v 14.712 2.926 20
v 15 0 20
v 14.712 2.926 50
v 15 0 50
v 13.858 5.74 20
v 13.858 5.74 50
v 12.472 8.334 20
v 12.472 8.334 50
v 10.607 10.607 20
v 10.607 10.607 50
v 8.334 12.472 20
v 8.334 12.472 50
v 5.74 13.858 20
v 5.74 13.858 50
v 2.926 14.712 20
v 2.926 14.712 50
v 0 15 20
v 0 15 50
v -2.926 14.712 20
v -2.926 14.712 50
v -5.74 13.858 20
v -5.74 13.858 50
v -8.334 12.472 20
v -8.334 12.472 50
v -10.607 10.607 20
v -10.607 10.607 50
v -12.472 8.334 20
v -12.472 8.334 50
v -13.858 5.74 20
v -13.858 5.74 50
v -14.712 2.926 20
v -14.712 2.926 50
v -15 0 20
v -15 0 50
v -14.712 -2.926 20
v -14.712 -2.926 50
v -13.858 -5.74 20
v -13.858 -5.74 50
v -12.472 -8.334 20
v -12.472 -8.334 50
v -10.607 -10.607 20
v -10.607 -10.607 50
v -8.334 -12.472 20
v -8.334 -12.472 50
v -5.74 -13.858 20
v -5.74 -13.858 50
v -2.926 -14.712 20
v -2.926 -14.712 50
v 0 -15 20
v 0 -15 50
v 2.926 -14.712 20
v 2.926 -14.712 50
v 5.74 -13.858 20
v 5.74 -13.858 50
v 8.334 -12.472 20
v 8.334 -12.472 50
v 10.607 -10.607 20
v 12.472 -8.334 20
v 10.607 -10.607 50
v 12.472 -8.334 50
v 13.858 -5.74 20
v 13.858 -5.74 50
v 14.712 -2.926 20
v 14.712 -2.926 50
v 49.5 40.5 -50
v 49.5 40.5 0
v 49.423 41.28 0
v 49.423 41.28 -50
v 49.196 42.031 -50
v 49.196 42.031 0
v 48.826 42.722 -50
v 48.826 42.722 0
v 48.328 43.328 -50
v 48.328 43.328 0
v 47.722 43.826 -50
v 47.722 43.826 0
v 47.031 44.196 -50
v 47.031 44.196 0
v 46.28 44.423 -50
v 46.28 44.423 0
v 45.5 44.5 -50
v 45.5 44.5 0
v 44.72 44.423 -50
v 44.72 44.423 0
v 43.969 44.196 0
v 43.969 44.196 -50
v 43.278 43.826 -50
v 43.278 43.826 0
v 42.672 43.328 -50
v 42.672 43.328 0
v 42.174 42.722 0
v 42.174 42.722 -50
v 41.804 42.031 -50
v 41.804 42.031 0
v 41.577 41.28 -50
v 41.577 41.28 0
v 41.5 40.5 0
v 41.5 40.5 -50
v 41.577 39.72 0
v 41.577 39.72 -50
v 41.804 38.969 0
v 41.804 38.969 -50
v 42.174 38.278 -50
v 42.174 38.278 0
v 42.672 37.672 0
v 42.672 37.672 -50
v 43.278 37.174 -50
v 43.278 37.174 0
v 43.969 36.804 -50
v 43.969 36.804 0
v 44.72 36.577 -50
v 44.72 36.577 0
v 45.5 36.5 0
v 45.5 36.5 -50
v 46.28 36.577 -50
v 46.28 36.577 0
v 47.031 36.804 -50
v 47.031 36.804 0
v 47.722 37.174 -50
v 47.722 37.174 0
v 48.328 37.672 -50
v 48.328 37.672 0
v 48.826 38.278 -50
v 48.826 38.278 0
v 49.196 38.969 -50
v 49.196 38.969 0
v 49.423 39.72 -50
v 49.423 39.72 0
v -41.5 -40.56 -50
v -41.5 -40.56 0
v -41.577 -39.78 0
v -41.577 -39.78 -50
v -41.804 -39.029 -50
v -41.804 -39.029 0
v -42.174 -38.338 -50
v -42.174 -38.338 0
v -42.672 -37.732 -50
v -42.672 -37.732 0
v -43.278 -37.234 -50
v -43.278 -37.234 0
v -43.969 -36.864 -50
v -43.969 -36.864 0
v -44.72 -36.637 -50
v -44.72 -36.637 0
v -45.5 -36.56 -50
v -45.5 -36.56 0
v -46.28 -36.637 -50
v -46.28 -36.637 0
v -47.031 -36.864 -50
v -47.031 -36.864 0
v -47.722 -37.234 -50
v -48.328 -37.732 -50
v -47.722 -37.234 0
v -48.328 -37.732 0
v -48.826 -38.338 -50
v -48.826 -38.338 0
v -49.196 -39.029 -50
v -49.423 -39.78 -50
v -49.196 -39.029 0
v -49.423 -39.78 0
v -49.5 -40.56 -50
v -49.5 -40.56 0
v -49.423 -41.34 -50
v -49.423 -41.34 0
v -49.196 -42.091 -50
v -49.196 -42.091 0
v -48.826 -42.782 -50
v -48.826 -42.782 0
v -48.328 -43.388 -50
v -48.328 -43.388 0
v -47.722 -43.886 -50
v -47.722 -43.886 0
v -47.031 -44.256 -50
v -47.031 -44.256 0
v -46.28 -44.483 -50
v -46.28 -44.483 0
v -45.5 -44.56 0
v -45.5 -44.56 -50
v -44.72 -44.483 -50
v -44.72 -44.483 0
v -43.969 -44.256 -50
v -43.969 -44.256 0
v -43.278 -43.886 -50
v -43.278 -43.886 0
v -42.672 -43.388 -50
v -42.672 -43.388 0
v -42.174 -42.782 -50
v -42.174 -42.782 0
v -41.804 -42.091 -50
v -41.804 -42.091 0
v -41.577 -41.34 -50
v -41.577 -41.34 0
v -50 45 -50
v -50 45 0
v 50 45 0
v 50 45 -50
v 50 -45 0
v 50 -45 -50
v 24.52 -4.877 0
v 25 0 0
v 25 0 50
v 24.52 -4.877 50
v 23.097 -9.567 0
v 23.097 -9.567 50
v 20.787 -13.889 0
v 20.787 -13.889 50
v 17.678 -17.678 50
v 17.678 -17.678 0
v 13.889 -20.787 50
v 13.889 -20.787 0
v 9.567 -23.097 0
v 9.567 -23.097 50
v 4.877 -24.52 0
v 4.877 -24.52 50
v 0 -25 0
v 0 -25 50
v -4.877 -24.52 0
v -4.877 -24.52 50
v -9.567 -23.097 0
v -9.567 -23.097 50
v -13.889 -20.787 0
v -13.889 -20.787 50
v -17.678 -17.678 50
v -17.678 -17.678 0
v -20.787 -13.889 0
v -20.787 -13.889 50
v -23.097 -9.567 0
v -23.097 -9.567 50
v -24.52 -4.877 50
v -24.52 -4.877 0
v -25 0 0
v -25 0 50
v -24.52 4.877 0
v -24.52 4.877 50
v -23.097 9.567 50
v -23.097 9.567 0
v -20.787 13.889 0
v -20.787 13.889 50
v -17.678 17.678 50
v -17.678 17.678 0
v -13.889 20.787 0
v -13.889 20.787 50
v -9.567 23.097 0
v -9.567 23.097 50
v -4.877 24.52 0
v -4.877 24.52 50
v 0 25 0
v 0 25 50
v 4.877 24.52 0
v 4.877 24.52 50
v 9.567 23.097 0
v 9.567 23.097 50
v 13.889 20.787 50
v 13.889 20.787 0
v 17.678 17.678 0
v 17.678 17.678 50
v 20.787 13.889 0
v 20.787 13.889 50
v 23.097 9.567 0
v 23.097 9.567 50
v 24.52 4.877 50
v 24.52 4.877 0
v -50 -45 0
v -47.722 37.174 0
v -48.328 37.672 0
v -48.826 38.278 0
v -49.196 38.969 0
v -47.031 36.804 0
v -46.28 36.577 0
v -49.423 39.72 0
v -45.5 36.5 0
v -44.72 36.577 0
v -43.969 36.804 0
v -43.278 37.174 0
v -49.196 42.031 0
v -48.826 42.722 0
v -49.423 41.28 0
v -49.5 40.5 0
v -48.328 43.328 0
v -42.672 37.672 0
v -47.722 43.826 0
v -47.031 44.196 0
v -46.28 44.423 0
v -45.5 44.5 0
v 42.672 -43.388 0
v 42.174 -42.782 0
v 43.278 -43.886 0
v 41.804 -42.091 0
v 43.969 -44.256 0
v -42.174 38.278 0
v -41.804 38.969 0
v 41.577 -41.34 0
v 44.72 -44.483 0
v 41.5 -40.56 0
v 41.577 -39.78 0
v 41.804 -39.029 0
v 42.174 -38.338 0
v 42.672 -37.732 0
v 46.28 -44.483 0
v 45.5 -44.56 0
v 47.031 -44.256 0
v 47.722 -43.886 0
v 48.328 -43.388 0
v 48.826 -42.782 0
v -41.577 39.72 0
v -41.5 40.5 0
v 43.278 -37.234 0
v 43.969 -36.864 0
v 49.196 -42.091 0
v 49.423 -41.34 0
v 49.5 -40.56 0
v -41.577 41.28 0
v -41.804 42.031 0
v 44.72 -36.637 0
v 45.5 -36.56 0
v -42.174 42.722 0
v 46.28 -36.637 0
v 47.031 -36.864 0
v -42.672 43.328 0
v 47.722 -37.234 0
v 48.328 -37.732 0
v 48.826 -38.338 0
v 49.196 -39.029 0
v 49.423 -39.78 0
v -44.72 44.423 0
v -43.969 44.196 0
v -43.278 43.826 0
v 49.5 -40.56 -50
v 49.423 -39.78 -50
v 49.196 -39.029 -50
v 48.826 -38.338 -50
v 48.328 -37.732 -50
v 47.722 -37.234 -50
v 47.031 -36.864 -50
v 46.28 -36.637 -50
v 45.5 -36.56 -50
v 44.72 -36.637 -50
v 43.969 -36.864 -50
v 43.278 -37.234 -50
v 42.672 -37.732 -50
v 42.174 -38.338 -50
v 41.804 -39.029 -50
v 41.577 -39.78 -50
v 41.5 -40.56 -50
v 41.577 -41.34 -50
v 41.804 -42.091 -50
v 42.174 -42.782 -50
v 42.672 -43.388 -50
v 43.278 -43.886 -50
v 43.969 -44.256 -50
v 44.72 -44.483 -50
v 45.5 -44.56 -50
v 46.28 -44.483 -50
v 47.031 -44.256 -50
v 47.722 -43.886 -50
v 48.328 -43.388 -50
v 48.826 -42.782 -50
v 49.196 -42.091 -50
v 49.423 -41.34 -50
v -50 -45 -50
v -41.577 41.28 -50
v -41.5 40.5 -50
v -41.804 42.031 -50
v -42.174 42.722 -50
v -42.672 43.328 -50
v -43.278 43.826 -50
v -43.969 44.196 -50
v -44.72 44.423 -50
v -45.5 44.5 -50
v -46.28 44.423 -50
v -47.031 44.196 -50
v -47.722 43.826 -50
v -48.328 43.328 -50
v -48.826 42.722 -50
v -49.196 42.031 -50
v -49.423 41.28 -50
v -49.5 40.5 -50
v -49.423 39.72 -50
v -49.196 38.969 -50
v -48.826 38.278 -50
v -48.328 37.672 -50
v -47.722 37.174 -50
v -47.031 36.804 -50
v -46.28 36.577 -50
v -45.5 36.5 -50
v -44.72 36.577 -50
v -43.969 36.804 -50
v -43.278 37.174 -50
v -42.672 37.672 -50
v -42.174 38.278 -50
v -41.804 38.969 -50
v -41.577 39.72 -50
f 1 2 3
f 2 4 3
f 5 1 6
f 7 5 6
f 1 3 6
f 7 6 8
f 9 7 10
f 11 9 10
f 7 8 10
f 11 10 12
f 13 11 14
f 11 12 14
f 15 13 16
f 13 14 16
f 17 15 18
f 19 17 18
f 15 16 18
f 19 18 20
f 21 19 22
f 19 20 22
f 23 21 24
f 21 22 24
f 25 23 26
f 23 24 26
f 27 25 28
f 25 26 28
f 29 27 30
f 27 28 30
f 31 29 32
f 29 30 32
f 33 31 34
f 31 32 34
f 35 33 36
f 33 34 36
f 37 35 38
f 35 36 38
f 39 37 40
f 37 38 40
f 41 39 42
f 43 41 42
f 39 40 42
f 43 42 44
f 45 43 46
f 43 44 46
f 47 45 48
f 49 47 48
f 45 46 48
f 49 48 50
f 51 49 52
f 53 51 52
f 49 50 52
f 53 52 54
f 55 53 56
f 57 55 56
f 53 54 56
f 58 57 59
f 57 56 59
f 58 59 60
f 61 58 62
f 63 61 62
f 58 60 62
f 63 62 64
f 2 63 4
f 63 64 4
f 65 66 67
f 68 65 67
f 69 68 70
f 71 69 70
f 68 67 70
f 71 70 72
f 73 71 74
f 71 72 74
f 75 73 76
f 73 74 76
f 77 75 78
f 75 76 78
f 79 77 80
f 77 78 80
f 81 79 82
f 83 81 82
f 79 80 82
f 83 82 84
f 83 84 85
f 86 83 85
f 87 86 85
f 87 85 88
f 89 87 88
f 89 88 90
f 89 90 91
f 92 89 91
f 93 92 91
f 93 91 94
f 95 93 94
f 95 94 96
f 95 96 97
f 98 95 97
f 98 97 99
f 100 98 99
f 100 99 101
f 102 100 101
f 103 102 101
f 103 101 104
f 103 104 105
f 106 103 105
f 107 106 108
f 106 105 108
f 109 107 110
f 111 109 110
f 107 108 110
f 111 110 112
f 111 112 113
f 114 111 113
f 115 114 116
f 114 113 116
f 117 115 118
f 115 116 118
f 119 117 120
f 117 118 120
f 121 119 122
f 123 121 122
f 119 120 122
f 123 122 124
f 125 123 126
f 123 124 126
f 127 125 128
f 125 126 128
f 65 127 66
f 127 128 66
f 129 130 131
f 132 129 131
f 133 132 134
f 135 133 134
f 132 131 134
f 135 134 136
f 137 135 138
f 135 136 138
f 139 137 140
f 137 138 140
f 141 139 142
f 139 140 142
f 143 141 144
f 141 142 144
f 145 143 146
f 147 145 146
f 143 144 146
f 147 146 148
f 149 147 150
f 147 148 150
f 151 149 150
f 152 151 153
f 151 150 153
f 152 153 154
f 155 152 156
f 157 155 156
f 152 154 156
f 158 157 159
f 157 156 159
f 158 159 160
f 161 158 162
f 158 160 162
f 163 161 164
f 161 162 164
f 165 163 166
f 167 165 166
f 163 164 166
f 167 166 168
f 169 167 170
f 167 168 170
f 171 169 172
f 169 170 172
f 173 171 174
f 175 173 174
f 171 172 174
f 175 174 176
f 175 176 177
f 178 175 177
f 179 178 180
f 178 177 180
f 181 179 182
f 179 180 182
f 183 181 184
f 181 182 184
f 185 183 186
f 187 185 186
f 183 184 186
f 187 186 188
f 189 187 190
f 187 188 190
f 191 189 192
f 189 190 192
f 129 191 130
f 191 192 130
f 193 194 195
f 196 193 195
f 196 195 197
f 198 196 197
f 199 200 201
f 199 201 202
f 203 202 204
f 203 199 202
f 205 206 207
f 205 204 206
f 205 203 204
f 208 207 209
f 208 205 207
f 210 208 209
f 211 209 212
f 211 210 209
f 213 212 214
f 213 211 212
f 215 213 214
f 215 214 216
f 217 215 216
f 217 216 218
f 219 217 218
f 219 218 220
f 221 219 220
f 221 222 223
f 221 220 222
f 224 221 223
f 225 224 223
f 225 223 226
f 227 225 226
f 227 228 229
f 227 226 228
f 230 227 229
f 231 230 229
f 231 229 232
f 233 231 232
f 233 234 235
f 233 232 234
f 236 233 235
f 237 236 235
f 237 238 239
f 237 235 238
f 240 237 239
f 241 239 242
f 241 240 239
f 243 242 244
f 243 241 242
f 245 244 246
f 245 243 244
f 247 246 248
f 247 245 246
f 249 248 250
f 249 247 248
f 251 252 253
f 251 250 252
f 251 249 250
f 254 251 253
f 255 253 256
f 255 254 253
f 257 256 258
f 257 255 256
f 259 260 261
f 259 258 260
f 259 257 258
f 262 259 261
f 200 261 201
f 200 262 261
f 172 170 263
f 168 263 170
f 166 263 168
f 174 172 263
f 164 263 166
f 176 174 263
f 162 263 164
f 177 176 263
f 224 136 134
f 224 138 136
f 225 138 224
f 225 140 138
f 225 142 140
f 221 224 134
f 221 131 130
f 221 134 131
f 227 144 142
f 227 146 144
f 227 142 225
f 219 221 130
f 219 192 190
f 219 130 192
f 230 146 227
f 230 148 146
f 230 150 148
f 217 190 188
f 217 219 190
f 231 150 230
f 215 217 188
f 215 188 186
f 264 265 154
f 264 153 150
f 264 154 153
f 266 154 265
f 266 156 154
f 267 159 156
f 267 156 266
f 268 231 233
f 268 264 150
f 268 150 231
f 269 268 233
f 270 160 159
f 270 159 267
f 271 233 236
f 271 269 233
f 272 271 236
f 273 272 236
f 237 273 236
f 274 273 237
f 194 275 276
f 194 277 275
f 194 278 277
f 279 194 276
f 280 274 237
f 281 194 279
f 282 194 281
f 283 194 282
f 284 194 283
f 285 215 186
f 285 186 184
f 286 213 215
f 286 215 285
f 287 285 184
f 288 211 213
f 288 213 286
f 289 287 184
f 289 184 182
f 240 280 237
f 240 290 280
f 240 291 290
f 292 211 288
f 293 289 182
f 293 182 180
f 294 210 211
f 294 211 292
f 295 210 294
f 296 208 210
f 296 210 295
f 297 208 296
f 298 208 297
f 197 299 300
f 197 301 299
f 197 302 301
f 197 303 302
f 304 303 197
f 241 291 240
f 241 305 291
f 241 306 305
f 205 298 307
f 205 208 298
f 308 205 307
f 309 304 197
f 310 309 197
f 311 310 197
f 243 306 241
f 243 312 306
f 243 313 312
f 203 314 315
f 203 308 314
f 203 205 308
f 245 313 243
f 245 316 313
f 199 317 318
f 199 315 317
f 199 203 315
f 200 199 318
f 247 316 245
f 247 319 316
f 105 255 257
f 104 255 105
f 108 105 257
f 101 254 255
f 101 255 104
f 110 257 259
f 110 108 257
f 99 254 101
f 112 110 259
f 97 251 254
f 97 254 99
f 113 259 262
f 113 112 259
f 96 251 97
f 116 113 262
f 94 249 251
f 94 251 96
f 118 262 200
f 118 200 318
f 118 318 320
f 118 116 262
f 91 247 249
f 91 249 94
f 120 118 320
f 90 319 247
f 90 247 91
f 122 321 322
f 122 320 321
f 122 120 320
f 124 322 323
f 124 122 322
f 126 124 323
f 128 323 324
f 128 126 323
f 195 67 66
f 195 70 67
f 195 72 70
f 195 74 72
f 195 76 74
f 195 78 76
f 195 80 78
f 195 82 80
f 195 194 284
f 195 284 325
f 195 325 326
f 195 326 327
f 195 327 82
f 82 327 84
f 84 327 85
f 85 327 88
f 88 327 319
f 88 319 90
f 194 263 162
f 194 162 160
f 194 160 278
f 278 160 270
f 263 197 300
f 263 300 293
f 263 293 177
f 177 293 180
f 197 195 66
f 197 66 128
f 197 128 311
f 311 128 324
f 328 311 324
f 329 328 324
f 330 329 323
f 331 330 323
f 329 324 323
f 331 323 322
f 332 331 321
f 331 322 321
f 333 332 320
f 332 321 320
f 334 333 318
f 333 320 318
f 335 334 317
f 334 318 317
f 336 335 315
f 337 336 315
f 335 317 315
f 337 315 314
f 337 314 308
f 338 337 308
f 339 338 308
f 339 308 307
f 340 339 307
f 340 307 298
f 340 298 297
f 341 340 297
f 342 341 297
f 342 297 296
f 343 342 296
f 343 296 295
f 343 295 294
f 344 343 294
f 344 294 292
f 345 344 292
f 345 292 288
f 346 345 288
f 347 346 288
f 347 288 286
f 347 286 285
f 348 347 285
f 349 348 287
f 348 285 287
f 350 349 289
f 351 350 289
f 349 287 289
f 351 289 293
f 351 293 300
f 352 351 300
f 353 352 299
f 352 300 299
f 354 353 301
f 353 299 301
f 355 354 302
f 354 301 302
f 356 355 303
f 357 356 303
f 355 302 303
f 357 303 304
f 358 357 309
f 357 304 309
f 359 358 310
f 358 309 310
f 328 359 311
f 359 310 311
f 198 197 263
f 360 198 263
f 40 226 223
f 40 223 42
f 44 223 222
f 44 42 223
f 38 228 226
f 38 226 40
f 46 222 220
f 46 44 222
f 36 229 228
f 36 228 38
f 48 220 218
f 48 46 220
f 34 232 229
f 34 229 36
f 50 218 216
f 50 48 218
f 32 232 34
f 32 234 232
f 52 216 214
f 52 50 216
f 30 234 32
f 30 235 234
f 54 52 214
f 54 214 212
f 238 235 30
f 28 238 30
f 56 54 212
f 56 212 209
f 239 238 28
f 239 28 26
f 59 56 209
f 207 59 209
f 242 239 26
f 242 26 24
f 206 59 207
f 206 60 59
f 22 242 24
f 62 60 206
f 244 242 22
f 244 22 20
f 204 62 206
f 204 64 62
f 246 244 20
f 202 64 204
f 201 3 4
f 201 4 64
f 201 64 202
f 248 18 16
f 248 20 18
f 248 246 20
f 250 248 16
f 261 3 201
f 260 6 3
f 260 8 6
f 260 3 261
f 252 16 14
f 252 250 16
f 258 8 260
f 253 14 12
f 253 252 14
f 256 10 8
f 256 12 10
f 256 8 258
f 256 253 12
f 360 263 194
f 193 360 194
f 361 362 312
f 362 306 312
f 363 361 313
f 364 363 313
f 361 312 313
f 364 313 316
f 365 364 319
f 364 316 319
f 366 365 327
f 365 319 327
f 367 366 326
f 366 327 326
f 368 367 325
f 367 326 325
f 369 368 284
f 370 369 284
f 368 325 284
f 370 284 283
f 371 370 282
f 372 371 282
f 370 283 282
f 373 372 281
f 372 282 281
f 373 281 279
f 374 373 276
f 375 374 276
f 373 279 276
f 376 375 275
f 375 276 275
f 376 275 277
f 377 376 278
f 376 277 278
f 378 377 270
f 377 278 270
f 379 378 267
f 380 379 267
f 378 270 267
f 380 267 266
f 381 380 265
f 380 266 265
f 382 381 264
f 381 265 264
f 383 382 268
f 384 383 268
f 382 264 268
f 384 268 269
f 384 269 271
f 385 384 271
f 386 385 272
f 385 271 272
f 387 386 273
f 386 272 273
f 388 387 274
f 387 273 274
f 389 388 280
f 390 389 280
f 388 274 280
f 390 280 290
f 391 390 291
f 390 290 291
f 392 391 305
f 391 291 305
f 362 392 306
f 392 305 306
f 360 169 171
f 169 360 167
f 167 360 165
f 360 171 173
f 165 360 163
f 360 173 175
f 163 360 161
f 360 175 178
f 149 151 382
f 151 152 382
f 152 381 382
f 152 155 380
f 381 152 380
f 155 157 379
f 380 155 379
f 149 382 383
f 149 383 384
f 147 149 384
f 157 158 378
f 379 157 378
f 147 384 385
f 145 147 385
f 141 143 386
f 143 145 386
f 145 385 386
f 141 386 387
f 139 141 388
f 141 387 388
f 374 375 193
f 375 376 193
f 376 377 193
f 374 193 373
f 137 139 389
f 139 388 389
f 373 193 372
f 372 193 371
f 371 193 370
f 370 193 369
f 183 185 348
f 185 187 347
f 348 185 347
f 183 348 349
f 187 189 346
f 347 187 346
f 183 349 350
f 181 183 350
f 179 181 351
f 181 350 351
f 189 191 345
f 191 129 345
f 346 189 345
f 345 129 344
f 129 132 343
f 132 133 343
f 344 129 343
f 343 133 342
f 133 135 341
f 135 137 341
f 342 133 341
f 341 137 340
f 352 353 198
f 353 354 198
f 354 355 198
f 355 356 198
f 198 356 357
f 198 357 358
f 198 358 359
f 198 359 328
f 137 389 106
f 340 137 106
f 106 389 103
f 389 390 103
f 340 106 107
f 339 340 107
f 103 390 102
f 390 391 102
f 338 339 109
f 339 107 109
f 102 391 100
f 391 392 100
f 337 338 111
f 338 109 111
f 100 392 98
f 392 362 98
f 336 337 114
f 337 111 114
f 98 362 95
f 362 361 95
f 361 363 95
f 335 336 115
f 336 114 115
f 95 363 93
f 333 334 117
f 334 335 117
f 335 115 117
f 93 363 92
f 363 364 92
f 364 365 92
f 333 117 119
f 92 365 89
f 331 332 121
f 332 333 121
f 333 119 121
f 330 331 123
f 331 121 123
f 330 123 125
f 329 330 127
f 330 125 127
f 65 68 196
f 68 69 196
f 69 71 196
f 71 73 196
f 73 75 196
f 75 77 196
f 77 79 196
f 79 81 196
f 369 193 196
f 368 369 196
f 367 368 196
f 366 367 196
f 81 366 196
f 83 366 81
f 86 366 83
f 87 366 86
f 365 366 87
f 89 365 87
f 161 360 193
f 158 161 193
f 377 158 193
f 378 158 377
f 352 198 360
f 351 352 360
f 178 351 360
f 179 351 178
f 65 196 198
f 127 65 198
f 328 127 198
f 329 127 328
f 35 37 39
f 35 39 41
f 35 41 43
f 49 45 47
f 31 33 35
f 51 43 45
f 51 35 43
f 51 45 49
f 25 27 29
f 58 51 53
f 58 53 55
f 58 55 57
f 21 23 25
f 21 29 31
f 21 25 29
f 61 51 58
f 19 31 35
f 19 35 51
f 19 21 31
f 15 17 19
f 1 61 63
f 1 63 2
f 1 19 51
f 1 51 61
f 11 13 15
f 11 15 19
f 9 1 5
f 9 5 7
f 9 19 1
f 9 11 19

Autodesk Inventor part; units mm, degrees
ref_plane "YZ Plane" through (0, 0, 0) normal (1, 0, 0) x (0, 1, 0)
ref_plane "XZ Plane" through (0, 0, 0) normal (0, 1, 0) x (-1, 0, 0)
ref_plane "XY Plane" through (0, 0, 0) normal (0, 0, 1) x (1, 0, 0)
sketch "Sketch1" plane through (0, 0, 0) normal (0, 0, 1) x (1, 0, 0)
  line L0 (-50, 45) -> (50, 45)
  line L1 (50, 45) -> (50, -45)
  line L2 (50, -45) -> (-50, -45)
  line L3 (-50, -45) -> (-50, 45)
  line L4 (-50, 45) -> (50, -45) construction
  line L5 (50, 45) -> (-50, -45) construction
  point P0 (0, 0)
extrude "Extrusion1" add sketch "Sketch1" against normal blind 50
sketch "Sketch2" plane through (0, 0, 0) normal (0, 0, 1) x (1, 0, 0)
  circle A0 centre (0, 0) radius 25
extrude "Extrusion2" add sketch "Sketch2" along normal blind 50
sketch "Sketch3" plane through (0, 0, 50) normal (0, 0, 1) x (1, 0, 0)
  circle A0 centre (0, 0) radius 15
extrude "Extrusion3" cut sketch "Sketch3" against normal blind 30
thread "Thread1" size "M50x4" class "6H" standard "ANSI Metric M Profile" full length
sketch "Sketch4" plane through (0, 0, 0) normal (0, 0, 1) x (1, 0, 0)
  line L0 (-50, 45) -> (50, 45) projected
  line L1 (-50, 45) -> (-41, 45)
  line L2 (-50, 36) -> (-50, 45)
  line L3 (50, 45) -> (41, 45)
  line L4 (50, 36) -> (50, 45)
  line L5 (50, -45.06) -> (41, -45.06)
  line L6 (50, -36.06) -> (50, -45.06)
  line L7 (-50, -45.06) -> (-41, -45.06)
  line L8 (-50, -36.06) -> (-50, -45.06)
  circle A0 centre (-45.5, 40.5) radius 4
  circle A1 centre (45.5, 40.5) radius 4
  circle A2 centre (45.5, -40.56) radius 4
  circle A3 centre (-45.5, -40.56) radius 4
  point P0 (0, 0)
extrude "Extrusion4" cut sketch "Sketch4" against normal through all
equation "\"BendRadius\" = Thickness"
equation "\"BendReliefWidth\" = Thickness"
equation "\"BendReliefDepth\" = 0.5 * Thickness"
equation "\"CornerReliefSize\" = 4 * Thickness"
equation "\"MinimumRemnant\" = 2 * Thickness"
equation "\"TransitionRadius\" = BendRadius"
equation "\"JacobiRadiusSize\" = BendRadius"
equation "\"GapSize\" = Thickness"
equation "\"Thickness\" = 3.048"
properties part number "Practica 1 Sofia Lopez"
